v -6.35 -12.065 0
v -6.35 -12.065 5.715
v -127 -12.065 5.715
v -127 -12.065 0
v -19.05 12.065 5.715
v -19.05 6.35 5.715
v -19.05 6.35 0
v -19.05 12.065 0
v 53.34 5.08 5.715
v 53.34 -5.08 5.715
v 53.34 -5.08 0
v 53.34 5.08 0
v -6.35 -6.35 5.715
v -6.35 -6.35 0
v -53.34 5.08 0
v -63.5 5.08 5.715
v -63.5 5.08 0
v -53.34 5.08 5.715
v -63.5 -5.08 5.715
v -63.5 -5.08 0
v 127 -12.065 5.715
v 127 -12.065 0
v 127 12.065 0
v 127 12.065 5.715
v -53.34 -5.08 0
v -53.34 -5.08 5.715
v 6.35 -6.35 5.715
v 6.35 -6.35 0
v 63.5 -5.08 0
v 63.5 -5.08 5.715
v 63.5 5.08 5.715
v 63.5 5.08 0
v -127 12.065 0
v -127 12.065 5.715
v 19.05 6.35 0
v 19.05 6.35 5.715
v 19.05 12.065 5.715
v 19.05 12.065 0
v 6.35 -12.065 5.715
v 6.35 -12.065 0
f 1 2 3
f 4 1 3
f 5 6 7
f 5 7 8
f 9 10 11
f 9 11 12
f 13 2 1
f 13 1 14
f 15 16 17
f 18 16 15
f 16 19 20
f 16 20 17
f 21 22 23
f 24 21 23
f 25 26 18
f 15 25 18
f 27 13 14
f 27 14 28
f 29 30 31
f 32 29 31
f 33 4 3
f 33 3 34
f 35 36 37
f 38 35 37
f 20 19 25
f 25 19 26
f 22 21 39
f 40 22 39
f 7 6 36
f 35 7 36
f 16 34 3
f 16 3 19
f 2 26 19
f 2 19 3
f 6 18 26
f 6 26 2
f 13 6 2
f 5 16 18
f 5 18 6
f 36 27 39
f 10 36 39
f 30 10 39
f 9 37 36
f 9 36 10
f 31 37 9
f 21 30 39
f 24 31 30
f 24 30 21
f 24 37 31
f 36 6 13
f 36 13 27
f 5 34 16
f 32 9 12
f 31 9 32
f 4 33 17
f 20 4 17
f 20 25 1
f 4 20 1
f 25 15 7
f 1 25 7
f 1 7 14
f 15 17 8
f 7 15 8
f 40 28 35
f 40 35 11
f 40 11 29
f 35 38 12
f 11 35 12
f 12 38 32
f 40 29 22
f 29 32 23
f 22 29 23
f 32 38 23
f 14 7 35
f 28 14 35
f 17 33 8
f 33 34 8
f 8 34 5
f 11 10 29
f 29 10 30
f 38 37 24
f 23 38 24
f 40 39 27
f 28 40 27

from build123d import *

# Parameters (mm, degrees)
SKETCH1_W           = 254
SKETCH1_H           = 50.8
BOSS_EXTRUDE1_DEPTH = 5.715
SKETCH2_W           = 10.16
SKETCH2_H           = 10.16
SKETCH2_W_2         = 12.7
SKETCH2_H_2         = 5.715
SKETCH2_W_3         = 38.1
CUT_EXTRUDE1_DEPTH  = 6.715
CUT_EXTRUDE2_DEPTH  = 6.715


with BuildPart() as part:
    # Sketch1 → Boss-Extrude1 (new body)
    with BuildSketch(Plane.XY):
        Rectangle(SKETCH1_W, SKETCH1_H)
    extrude(amount=BOSS_EXTRUDE1_DEPTH)

    # Sketch2 → Cut-Extrude1 (cut, through all)
    with BuildSketch(Plane.XY.offset(5.715)):
        with Locations((-58.42, 0)):
            Rectangle(SKETCH2_W, SKETCH2_H)
        with Locations((58.42, 0)):
            Rectangle(SKETCH2_W, SKETCH2_H)
        with Locations((0, -9.2075)):
            Rectangle(SKETCH2_W_2, SKETCH2_H_2)
        with Locations((0, 9.2075)):
            Rectangle(SKETCH2_W_3, SKETCH2_H_2)
    extrude(amount=-CUT_EXTRUDE1_DEPTH, mode=Mode.SUBTRACT)

    # Sketch3 → Cut-Extrude2 (cut, through all)
    with BuildSketch(Plane.XY.offset(5.715)):
        Polygon((-127, 25.4), (-127, 12.065), (-19.05, 12.065), (19.05, 12.065), (127, 12.065), (127, 25.4), align=None)
        Polygon((-6.35, -12.065), (-127, -12.065), (-127, -25.4), (127, -25.4), (127, -12.065), (6.35, -12.065), align=None)
    extrude(amount=-CUT_EXTRUDE2_DEPTH, mode=Mode.SUBTRACT)


solid = part.part
